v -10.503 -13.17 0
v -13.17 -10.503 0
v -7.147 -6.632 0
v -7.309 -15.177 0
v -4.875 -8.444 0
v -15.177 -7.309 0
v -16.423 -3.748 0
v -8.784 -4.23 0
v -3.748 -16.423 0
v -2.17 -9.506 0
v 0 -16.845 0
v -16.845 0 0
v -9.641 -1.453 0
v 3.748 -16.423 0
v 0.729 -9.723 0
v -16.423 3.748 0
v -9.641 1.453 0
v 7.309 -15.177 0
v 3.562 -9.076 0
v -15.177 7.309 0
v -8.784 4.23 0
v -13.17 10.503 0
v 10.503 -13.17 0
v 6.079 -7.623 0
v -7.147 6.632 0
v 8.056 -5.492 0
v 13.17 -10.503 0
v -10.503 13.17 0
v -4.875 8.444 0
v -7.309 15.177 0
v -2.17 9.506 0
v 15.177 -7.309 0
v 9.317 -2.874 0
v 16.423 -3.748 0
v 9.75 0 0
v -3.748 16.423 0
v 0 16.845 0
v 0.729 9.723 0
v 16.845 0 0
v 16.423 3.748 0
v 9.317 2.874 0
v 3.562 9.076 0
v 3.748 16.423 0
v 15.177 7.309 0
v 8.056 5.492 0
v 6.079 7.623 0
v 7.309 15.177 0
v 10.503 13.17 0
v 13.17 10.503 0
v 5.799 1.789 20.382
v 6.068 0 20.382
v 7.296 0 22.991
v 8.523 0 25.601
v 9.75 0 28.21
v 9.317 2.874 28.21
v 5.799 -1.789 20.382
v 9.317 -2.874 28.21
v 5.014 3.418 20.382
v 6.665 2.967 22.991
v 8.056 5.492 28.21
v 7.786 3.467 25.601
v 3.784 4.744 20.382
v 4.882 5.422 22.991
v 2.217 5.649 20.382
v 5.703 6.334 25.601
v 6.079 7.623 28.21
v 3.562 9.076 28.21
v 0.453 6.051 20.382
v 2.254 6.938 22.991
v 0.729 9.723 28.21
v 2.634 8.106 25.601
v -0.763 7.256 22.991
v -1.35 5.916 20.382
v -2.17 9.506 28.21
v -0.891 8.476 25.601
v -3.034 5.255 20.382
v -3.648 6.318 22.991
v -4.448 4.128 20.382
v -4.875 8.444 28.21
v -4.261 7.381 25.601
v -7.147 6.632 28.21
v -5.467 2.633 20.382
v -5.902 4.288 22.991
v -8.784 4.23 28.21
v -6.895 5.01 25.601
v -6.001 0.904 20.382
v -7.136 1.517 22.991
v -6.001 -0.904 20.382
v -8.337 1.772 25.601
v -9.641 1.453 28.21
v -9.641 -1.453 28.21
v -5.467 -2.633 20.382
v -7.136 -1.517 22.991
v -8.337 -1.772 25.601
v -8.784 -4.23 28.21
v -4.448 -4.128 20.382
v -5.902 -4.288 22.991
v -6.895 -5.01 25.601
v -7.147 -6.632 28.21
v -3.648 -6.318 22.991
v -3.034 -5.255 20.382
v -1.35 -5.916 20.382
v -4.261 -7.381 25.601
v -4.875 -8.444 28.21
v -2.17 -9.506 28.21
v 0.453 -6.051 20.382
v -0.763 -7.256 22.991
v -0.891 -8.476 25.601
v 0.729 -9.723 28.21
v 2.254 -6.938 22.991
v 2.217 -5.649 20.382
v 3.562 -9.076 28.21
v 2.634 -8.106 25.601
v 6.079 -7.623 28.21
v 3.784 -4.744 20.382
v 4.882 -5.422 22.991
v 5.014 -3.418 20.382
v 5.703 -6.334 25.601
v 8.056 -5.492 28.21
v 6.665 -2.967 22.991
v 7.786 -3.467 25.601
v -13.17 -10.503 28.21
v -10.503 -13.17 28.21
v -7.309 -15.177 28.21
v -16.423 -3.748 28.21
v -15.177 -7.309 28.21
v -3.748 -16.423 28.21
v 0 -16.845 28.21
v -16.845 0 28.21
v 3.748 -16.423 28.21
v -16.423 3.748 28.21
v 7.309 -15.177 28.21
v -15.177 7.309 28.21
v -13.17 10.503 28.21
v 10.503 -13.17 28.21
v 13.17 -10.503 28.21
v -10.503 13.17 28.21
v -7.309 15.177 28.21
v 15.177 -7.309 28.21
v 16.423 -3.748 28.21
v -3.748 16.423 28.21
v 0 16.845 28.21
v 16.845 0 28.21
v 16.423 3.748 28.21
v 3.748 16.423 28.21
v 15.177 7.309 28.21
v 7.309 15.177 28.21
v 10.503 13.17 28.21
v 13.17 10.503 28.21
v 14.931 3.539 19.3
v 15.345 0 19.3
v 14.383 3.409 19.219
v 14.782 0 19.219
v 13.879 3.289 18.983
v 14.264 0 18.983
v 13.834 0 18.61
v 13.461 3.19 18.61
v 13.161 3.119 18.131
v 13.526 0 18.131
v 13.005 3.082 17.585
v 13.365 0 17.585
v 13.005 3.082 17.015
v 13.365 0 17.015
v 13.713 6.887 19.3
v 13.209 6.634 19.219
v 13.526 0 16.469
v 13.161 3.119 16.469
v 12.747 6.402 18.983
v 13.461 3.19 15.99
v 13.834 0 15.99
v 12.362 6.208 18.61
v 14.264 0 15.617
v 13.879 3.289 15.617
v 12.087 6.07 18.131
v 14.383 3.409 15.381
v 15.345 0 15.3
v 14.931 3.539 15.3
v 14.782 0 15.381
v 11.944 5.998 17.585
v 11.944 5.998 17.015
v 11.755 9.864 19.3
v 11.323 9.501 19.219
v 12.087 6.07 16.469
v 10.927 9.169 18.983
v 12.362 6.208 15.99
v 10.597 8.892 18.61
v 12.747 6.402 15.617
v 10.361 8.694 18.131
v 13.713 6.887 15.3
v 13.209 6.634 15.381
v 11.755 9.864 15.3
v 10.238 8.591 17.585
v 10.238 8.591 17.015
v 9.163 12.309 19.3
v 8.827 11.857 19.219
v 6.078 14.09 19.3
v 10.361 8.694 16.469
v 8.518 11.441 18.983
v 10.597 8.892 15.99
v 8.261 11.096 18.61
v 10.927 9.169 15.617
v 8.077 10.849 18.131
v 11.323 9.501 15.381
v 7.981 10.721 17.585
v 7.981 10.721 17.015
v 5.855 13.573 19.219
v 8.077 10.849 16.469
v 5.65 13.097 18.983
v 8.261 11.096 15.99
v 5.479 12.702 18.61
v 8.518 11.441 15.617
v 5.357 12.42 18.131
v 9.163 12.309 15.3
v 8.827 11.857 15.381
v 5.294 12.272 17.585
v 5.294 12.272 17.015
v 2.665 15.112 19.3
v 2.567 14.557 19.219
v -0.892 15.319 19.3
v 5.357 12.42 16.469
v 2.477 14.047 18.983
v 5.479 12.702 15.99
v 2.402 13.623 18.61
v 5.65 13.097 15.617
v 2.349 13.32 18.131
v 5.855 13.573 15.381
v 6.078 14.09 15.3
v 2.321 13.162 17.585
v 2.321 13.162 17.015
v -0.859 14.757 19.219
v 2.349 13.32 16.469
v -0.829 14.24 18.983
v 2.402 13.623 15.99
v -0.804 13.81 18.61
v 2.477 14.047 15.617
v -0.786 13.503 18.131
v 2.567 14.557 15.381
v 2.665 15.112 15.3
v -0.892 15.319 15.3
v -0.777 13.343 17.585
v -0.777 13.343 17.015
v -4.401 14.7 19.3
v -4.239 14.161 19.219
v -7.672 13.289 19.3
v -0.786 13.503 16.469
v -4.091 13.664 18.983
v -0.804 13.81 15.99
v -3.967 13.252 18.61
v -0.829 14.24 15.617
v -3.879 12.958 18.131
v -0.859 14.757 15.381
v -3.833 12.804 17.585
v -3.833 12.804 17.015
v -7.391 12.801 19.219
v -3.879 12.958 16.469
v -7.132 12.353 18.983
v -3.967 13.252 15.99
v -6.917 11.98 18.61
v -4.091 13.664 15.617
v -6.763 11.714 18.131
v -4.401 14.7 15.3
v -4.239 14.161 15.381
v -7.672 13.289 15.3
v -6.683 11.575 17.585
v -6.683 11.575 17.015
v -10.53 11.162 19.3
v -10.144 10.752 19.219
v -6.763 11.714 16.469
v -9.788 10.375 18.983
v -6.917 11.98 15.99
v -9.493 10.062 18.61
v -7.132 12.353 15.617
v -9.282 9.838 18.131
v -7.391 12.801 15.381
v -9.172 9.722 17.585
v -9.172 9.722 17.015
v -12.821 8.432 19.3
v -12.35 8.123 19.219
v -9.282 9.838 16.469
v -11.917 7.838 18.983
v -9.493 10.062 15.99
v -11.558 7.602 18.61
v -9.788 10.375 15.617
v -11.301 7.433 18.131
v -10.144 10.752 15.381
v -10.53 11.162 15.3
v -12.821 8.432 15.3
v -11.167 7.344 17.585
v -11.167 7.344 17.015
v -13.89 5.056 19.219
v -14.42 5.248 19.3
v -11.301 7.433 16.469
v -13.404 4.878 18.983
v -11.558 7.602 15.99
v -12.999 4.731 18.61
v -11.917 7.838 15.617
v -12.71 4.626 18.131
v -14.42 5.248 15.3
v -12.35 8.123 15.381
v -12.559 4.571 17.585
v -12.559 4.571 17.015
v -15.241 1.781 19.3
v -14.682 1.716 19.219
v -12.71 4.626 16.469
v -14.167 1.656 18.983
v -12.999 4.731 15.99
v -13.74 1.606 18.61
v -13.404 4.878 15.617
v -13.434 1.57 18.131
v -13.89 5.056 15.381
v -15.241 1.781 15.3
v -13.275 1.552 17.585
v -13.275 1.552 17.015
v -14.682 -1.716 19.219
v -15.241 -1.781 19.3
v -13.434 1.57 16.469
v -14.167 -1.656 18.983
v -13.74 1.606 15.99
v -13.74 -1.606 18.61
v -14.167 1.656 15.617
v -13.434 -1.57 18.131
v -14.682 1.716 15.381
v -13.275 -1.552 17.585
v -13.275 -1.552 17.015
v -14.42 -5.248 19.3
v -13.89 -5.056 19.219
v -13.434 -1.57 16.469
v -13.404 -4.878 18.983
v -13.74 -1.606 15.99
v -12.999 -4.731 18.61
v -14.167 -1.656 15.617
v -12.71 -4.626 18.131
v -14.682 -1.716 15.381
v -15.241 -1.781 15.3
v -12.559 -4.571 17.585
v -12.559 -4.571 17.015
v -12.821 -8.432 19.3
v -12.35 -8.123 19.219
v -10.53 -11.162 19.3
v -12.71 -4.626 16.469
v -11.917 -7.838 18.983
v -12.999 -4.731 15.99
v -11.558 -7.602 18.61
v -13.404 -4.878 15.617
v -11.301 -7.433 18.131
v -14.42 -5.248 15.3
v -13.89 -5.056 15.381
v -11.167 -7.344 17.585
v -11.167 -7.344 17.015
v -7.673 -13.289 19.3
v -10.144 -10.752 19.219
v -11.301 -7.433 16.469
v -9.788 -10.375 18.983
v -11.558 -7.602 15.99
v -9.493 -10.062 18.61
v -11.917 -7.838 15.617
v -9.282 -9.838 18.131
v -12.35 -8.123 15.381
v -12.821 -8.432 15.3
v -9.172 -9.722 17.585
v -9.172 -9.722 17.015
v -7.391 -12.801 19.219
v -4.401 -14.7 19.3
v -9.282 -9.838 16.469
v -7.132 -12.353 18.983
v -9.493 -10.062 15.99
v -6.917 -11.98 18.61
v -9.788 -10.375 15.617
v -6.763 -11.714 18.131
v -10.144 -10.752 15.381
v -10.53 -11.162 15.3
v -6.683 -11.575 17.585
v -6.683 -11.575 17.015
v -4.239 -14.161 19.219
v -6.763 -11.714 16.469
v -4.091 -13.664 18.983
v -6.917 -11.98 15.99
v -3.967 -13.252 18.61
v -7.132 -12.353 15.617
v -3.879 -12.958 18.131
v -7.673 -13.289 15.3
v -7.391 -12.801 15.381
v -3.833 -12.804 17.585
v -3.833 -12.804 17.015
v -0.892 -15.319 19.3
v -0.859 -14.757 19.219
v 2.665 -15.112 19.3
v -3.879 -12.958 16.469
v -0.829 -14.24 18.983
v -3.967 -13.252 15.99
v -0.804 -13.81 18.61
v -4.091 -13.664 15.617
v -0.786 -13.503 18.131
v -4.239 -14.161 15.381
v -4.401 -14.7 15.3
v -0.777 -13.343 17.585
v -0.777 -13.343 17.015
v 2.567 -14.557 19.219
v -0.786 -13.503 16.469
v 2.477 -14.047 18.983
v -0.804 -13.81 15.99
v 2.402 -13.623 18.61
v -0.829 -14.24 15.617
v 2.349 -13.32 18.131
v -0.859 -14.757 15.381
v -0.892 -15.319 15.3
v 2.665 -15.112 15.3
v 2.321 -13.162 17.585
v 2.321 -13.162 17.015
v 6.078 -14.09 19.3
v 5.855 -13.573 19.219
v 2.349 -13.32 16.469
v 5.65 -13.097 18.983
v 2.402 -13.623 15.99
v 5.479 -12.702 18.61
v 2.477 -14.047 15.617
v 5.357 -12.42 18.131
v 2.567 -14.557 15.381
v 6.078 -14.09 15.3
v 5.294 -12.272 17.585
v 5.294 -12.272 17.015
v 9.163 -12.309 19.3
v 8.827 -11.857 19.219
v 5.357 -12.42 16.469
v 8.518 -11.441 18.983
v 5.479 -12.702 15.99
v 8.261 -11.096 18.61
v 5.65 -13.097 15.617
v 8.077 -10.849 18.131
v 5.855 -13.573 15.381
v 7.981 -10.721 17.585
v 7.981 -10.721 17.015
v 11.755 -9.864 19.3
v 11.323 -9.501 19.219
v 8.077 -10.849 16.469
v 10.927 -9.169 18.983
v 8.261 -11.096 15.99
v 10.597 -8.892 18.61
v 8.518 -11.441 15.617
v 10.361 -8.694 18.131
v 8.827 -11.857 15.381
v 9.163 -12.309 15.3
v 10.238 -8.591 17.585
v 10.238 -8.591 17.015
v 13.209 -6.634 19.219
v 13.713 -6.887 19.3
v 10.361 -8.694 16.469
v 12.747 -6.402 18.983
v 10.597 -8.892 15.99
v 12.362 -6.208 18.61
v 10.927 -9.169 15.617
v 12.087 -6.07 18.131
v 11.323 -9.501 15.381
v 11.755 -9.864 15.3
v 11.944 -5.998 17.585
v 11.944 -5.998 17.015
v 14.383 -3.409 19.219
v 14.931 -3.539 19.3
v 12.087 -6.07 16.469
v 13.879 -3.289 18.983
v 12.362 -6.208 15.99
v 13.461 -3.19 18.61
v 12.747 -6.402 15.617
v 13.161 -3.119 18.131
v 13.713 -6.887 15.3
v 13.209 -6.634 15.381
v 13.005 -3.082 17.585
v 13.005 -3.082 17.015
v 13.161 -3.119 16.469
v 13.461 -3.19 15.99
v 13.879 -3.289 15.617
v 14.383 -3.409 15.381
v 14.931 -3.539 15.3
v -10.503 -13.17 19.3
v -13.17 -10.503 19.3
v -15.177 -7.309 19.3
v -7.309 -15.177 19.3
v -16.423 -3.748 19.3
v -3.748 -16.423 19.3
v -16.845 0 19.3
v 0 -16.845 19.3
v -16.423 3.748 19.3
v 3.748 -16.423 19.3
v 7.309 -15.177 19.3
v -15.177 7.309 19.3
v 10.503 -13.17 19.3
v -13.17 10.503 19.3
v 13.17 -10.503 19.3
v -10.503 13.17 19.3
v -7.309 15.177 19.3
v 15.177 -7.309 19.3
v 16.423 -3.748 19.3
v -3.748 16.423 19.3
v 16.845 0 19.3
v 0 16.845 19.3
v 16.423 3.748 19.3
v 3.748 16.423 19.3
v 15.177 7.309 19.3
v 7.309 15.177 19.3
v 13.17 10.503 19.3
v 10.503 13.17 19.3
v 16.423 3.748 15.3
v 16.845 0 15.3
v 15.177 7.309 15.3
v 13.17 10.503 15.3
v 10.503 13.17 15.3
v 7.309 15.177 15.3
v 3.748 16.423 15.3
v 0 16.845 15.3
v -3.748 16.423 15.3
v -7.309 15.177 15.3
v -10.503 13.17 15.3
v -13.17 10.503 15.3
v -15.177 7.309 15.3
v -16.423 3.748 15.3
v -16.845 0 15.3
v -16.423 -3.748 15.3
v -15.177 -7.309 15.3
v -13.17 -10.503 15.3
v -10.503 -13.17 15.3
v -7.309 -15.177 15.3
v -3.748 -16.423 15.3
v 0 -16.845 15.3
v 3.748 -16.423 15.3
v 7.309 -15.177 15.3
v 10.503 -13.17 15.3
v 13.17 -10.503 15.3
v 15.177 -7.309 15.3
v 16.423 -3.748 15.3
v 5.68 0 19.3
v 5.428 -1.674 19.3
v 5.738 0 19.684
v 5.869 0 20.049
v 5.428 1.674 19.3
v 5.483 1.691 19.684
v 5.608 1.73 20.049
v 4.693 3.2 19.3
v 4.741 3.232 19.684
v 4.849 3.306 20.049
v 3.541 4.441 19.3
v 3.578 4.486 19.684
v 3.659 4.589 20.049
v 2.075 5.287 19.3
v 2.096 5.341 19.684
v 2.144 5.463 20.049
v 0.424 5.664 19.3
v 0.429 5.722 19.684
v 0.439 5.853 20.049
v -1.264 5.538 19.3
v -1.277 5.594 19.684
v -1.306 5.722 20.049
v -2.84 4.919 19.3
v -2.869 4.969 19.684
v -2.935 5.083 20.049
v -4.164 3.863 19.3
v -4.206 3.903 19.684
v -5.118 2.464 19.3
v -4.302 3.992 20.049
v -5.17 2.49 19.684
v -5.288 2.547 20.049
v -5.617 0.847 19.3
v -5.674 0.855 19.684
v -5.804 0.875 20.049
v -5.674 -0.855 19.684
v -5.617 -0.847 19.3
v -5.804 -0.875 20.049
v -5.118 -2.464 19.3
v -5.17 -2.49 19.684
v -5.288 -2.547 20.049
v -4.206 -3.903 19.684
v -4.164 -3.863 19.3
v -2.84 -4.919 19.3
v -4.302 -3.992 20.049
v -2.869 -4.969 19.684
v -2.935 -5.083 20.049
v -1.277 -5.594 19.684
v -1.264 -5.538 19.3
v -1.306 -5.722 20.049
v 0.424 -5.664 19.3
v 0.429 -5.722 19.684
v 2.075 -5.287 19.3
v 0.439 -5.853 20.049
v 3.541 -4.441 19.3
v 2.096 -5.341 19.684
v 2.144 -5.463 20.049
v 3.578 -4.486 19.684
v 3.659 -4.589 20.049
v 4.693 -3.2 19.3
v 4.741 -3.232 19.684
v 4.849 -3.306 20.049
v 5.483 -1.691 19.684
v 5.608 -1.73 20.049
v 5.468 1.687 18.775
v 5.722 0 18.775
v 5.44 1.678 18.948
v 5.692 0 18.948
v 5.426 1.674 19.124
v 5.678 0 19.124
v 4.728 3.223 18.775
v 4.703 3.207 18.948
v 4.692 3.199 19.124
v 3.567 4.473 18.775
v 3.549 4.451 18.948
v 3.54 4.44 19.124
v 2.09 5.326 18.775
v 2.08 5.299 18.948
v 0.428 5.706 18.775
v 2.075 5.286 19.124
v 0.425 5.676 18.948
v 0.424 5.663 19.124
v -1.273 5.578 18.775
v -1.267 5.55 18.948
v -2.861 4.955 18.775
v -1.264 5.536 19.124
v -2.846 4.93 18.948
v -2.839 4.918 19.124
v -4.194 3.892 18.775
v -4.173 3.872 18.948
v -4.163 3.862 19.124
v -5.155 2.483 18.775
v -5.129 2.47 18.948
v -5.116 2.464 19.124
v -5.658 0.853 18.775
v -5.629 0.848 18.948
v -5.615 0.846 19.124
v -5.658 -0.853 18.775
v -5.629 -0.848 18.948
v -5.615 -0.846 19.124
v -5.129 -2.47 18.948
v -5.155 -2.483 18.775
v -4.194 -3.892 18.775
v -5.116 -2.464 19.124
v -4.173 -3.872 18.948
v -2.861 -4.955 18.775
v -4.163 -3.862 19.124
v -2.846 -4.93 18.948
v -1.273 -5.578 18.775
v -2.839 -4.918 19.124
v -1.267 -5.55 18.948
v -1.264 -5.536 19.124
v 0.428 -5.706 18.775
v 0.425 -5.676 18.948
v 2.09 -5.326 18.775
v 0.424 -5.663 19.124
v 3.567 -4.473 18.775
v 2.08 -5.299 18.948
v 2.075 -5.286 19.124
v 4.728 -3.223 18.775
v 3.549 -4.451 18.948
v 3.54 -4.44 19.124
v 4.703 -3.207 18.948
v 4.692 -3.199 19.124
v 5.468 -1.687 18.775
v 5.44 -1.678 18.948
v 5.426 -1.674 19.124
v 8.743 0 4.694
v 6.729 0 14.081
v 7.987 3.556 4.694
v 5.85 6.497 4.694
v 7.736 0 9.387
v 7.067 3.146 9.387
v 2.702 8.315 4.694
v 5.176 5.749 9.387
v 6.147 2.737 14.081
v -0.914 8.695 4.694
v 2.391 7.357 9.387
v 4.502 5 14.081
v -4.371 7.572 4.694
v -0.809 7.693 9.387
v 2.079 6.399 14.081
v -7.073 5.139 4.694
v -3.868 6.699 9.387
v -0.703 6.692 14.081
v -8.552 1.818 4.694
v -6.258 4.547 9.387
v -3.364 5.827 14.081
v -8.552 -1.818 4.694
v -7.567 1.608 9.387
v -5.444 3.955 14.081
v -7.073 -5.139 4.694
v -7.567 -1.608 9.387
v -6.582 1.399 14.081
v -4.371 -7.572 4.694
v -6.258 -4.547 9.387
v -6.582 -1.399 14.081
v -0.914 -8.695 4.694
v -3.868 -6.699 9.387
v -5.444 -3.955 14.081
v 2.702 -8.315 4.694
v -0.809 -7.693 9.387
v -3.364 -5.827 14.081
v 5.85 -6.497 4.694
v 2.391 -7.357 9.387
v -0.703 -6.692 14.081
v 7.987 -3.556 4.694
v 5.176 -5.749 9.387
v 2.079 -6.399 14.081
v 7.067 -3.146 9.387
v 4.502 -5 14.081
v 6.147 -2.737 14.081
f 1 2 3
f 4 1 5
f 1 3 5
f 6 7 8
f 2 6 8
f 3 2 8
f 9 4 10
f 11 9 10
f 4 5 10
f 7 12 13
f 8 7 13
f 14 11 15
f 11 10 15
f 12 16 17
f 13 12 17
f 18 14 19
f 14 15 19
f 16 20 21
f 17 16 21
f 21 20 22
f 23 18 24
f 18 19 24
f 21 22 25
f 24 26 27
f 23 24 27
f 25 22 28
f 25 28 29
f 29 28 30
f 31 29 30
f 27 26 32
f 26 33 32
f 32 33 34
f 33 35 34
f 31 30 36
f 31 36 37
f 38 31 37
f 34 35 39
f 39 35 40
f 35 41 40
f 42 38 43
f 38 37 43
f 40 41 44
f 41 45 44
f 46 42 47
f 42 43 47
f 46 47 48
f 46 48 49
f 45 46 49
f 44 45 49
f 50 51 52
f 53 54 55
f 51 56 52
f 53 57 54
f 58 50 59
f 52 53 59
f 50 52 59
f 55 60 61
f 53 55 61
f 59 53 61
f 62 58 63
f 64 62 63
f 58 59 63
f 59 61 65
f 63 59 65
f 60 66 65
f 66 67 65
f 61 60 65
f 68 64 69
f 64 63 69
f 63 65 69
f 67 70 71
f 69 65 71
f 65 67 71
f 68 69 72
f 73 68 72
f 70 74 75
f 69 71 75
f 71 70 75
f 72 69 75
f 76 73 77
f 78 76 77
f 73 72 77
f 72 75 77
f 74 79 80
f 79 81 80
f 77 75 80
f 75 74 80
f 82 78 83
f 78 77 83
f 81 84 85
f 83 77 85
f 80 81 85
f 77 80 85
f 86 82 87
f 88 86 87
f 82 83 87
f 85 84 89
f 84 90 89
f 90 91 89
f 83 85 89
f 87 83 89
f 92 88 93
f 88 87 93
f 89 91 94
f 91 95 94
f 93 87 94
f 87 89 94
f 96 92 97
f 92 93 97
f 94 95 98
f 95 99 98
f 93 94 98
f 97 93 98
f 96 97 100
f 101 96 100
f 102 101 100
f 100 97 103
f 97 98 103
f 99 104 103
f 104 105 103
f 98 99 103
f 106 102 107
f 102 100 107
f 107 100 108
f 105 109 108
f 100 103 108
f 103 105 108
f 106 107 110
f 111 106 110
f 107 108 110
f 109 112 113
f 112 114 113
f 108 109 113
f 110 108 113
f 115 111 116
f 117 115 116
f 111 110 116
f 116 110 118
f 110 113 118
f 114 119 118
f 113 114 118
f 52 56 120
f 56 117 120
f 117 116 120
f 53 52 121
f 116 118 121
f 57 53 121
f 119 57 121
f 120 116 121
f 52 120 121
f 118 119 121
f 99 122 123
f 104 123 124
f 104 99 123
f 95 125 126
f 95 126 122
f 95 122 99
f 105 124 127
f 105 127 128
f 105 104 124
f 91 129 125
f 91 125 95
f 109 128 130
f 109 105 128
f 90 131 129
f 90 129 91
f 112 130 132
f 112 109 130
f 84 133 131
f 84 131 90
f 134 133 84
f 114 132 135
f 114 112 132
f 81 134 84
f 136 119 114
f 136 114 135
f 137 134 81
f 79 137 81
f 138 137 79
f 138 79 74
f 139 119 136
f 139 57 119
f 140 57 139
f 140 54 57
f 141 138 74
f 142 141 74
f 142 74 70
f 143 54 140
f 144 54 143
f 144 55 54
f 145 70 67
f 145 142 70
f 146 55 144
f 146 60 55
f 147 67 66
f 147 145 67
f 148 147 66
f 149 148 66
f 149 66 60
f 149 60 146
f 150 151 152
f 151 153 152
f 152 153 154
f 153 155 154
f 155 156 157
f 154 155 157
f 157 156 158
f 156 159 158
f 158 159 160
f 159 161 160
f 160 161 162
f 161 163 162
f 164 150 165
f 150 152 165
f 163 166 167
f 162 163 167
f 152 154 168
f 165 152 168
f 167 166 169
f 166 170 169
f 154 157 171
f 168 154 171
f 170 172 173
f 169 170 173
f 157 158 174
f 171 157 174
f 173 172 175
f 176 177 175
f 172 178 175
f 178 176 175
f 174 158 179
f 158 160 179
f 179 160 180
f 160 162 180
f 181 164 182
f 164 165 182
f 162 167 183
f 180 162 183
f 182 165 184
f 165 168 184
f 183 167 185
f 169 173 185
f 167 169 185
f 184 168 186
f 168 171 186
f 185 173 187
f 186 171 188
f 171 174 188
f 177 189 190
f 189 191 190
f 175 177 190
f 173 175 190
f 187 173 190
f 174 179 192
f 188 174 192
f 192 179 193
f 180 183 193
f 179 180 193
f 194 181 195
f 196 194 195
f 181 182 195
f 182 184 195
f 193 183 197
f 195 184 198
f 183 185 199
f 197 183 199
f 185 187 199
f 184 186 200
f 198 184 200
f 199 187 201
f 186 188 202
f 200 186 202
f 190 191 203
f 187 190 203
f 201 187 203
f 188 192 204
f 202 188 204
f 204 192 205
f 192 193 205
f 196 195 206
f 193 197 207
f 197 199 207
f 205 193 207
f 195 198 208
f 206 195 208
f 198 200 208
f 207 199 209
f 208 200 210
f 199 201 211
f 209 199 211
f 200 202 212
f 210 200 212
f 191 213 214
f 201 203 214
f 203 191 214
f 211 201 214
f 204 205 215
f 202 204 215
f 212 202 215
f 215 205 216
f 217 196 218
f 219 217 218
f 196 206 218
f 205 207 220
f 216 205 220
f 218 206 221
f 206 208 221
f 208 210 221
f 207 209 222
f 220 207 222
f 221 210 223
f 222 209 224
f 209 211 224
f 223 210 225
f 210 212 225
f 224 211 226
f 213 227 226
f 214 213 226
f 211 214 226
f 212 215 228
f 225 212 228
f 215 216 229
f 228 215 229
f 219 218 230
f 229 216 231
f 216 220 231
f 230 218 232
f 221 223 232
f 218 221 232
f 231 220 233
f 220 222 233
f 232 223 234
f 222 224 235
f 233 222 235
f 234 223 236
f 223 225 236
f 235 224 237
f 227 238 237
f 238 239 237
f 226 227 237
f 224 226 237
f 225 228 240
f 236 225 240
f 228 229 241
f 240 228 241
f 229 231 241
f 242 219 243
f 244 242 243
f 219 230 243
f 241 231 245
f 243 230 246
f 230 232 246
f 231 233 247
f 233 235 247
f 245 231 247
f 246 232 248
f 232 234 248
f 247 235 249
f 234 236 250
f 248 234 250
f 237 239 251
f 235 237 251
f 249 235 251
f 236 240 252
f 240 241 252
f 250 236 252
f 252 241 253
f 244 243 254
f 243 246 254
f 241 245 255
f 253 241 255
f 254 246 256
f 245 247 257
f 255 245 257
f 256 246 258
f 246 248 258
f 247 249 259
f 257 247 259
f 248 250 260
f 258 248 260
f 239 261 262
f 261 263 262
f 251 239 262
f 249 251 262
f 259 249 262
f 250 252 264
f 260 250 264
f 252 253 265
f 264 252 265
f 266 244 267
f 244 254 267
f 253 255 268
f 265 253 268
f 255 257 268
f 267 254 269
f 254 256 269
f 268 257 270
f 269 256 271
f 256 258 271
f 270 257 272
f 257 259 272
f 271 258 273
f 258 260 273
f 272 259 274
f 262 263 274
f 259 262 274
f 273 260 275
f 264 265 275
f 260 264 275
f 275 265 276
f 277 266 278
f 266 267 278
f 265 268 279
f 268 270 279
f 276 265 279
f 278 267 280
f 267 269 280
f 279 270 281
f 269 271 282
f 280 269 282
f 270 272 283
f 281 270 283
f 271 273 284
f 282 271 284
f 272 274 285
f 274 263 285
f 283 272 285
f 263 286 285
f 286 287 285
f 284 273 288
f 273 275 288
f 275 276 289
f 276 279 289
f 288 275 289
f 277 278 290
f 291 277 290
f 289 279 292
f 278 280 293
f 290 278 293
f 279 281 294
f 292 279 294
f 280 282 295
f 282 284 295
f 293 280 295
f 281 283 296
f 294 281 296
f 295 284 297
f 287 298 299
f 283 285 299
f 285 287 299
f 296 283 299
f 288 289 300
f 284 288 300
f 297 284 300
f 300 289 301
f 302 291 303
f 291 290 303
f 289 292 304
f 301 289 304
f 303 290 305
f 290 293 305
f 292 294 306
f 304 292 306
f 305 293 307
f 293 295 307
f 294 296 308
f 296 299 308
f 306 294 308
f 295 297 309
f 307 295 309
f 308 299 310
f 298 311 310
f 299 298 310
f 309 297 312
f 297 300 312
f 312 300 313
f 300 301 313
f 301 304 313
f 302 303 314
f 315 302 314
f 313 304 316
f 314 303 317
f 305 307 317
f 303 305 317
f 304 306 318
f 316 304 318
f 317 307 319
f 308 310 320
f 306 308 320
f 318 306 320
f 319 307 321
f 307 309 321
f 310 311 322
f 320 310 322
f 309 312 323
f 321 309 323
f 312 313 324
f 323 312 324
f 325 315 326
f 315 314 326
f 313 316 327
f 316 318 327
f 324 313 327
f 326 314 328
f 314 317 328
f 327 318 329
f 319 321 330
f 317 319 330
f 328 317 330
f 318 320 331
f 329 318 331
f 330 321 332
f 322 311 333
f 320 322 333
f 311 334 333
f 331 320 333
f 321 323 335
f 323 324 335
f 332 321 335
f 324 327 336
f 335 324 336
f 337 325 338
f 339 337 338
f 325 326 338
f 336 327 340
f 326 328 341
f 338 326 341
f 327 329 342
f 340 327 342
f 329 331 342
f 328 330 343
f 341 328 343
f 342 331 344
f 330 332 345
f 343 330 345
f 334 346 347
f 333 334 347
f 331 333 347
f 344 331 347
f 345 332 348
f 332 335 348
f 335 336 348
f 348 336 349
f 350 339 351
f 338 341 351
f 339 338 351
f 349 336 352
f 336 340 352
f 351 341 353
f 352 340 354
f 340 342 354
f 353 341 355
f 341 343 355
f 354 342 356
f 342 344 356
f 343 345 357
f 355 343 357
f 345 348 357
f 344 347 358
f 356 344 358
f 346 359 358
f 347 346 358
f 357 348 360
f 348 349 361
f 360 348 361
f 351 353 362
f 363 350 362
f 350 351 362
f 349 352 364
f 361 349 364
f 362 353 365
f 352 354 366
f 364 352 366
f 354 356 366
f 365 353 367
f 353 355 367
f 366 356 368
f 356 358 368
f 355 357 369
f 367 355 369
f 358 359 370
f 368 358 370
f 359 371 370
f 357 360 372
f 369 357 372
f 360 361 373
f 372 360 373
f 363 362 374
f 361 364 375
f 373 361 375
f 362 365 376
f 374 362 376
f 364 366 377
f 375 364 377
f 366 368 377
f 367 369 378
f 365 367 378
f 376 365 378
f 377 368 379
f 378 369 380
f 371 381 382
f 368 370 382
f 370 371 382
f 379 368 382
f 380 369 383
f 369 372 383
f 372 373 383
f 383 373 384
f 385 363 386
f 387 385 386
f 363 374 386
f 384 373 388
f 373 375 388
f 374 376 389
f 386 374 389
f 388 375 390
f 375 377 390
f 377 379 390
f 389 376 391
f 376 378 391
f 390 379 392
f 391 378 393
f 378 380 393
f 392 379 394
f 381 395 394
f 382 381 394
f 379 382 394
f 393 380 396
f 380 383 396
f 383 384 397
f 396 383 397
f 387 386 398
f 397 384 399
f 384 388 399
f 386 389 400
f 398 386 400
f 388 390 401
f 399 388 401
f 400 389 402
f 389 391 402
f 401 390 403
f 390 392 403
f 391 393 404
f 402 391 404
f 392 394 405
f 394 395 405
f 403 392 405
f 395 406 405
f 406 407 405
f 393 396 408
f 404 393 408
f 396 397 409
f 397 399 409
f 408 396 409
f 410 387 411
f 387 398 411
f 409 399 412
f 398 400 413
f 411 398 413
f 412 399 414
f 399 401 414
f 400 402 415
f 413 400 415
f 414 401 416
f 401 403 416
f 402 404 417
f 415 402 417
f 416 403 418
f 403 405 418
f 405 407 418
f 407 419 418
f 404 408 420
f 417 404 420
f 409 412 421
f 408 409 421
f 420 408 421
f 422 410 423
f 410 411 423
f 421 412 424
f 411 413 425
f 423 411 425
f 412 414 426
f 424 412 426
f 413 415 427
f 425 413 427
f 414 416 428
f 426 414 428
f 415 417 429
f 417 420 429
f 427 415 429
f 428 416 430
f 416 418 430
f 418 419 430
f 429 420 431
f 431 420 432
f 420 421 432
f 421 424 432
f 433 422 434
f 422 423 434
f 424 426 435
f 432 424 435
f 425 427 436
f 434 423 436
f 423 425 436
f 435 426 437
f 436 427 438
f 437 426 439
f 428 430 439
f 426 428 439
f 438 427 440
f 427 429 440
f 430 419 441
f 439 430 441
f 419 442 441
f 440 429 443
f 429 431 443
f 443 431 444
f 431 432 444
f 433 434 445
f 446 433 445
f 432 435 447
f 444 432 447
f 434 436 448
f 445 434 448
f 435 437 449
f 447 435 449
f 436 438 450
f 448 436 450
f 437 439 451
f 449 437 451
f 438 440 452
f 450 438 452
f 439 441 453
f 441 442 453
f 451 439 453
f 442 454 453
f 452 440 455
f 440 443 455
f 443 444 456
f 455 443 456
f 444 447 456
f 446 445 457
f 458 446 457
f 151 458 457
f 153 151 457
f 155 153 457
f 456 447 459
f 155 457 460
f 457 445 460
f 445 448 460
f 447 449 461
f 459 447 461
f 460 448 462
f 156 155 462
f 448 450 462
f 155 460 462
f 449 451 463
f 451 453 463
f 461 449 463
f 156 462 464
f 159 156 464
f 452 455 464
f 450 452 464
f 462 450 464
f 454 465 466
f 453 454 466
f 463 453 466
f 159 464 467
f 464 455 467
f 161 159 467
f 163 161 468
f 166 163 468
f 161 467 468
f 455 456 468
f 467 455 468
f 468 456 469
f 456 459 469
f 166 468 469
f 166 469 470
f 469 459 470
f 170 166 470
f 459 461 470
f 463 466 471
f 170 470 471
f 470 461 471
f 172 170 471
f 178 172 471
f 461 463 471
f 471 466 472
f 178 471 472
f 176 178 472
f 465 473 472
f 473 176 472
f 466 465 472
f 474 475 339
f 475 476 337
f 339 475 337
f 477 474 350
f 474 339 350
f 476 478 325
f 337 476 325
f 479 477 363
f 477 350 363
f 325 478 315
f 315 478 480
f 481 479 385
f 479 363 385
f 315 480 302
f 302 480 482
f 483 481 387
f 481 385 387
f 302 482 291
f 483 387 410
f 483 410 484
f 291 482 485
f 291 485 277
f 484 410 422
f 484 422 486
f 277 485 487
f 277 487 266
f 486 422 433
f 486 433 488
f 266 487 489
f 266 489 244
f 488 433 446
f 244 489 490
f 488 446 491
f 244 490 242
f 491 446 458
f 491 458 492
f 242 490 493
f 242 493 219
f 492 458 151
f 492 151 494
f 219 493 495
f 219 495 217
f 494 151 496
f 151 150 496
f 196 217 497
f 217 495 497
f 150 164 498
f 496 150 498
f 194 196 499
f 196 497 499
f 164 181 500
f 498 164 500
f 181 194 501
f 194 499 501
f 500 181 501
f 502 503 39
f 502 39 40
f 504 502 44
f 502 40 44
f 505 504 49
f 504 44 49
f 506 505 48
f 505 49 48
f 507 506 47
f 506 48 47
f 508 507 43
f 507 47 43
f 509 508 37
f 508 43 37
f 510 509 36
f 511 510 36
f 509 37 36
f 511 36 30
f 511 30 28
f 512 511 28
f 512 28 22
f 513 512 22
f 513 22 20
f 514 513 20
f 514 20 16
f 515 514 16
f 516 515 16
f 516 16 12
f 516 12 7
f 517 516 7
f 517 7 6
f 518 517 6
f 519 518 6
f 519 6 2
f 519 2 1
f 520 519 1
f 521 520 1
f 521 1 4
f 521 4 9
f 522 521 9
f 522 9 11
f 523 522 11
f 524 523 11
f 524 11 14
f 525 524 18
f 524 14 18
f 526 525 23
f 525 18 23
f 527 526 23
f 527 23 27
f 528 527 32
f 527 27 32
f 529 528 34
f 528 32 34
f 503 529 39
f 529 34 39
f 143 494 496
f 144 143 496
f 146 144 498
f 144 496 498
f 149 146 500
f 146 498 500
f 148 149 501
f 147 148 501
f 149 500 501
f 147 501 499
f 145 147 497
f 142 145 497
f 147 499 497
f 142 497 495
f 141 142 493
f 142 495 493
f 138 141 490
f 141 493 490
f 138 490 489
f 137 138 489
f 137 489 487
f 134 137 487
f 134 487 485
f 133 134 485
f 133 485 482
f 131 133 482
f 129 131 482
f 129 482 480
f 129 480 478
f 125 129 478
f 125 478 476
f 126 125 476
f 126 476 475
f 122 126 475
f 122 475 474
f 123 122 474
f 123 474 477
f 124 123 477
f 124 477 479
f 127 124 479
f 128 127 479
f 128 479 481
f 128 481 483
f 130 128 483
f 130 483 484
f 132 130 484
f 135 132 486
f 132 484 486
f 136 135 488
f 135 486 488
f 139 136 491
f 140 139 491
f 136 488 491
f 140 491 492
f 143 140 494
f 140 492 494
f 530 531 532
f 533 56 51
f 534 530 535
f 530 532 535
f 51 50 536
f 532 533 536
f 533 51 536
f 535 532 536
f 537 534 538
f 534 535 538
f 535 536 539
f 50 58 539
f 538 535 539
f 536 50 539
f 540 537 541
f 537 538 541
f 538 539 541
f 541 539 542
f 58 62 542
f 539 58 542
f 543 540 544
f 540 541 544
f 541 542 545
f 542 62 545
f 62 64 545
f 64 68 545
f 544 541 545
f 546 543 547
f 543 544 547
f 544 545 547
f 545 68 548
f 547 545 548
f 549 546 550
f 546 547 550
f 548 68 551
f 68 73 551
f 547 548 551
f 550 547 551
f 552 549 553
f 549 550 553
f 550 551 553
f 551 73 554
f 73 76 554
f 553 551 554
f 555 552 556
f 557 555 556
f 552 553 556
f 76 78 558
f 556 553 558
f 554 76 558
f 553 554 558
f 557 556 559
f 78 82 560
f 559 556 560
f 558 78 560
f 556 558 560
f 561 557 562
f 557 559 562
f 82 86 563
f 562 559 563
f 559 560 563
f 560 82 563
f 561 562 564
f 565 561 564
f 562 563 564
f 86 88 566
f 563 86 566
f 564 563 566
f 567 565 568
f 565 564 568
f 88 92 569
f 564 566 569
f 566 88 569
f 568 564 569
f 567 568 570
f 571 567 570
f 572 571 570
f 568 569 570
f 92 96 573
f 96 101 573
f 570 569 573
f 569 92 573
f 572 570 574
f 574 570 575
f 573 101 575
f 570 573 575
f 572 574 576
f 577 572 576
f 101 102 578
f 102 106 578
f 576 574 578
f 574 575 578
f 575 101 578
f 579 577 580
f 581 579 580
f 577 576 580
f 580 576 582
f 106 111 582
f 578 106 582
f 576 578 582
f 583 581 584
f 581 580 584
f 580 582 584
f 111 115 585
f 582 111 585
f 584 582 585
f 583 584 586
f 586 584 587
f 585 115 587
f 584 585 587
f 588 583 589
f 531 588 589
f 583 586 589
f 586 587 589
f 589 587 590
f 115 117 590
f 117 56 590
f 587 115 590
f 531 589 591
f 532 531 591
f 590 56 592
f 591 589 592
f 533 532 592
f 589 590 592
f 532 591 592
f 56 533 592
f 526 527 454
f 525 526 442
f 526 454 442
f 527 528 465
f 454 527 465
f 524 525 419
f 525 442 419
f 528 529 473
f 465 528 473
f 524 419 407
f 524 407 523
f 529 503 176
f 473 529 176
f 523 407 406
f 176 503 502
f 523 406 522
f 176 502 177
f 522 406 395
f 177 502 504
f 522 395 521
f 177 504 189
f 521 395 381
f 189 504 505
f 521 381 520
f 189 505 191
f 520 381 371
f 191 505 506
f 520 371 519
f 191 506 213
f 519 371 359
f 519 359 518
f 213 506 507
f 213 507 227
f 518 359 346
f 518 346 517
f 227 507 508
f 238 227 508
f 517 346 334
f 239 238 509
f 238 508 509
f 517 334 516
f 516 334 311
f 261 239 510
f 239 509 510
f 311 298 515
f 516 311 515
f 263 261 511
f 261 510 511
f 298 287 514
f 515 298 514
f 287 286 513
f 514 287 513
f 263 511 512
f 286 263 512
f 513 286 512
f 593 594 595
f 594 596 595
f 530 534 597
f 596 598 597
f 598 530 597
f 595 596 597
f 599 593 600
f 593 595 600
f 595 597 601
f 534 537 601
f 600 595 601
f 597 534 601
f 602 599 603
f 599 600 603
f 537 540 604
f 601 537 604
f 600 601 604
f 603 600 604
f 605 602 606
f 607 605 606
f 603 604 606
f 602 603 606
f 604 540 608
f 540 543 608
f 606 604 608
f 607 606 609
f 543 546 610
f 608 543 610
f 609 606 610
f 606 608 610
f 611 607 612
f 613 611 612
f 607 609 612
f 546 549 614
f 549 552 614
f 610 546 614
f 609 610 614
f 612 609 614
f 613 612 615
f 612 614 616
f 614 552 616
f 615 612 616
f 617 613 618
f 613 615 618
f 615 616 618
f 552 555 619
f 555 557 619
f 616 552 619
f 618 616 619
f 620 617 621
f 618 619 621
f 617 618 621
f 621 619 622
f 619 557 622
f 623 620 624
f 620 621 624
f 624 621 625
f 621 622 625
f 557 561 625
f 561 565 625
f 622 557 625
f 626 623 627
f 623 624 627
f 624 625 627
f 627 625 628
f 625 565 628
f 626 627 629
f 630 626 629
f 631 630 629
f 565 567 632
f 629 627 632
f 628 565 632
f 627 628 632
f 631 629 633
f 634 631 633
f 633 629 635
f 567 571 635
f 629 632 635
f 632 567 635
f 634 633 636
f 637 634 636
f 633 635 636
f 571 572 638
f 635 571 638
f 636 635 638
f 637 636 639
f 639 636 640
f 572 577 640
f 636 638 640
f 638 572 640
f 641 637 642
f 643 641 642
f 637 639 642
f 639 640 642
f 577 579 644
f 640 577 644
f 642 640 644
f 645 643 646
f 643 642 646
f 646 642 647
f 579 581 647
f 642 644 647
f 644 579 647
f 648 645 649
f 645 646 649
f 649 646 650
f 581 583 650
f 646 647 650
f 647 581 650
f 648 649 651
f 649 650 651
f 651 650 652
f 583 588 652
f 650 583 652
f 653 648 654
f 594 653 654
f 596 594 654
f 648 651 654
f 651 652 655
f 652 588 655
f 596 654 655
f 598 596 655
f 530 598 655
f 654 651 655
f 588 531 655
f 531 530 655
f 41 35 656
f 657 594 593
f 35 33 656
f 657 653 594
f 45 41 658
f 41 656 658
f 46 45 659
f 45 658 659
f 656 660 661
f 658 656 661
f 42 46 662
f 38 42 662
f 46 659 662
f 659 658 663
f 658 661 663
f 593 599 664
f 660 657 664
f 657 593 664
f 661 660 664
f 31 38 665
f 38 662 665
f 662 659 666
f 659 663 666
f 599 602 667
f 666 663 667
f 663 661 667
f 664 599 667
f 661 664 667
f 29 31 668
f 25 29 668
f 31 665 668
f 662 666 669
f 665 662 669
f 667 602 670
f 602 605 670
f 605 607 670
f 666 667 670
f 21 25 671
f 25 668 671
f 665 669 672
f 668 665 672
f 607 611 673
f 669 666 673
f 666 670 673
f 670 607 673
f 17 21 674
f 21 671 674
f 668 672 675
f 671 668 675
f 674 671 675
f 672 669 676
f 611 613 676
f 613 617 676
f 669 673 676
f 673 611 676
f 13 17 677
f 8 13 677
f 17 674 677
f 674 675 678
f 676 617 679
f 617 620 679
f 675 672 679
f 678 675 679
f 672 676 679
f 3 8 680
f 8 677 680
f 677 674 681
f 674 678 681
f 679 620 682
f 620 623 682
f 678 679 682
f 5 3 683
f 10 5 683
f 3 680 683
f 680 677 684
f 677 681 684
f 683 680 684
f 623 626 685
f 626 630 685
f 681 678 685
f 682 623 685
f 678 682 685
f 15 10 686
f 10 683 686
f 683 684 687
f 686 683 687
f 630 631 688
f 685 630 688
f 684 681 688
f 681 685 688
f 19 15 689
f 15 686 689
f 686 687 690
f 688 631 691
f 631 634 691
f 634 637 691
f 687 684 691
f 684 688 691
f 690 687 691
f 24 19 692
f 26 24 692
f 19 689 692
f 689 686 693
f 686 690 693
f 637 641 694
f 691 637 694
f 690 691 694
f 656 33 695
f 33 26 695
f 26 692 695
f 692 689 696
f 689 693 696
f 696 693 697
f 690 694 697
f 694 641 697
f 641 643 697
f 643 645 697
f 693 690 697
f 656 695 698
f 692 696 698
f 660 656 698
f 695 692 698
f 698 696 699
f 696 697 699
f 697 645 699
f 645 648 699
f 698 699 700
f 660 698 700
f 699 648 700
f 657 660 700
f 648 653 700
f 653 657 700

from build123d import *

# Parameters (mm, degrees)
F0_R     = 16.845
F0_R_2   = 9.75
F1_DEPTH = 28.21
F0_R_3   = 4.825
F2_DEPTH = 28.21


with BuildPart() as f1:
    # F0 (on Top) → F1 (new body)
    with BuildSketch(Plane.XY):
        Circle(F0_R)
        Circle(F0_R_2, mode=Mode.SUBTRACT)
    extrude(amount=F1_DEPTH)

    # F0 (on Top) → F2 (join)
    with BuildSketch(Plane.XY):
        Circle(F0_R_2)
        Circle(F0_R_3, mode=Mode.SUBTRACT)
    extrude(amount=F2_DEPTH)

    # F3 (on Front) → F4 (revolve, cut)
    with BuildSketch(Plane.XZ):
        with BuildLine():
            Line((15.345, 15.3), (16.845, 15.3))
            Line((16.845, 15.3), (16.845, 19.3))
            Line((16.845, 19.3), (15.345, 19.3))
            ThreePointArc((15.345, 19.3), (13.345, 17.3), (15.345, 15.3))
        make_face()
    revolve(axis=Axis((0, 0, 14.105), (0, 0, 1)), mode=Mode.SUBTRACT)

    # F5 (on Front) → F6 (revolve, cut)
    with BuildSketch(Plane.XZ):
        with BuildLine():
            ThreePointArc((5.680042, 19.3), (5.794747, 19.869563), (6.068315, 20.382124))
            Line((6.068315, 20.382124), (9.75, 28.21))
            Line((9.75, 28.21), (0, 28.21))
            Line((0, 28.21), (0, 19.3))
            Line((0, 19.3), (5.680042, 19.3))
        make_face()
        with BuildLine():
            ThreePointArc((5.721742, 18.774543), (5.683505, 19.035892), (5.680042, 19.3))
            Line((5.680042, 19.3), (0, 19.3))
            Line((0, 19.3), (0, 0))
            Line((0, 0), (9.75, 0))
            Line((9.75, 0), (5.721742, 18.774543))
        make_face()
    revolve(axis=Axis((0, 0, 14.105), (0, 0, 1)), mode=Mode.SUBTRACT)


solid = f1.part
